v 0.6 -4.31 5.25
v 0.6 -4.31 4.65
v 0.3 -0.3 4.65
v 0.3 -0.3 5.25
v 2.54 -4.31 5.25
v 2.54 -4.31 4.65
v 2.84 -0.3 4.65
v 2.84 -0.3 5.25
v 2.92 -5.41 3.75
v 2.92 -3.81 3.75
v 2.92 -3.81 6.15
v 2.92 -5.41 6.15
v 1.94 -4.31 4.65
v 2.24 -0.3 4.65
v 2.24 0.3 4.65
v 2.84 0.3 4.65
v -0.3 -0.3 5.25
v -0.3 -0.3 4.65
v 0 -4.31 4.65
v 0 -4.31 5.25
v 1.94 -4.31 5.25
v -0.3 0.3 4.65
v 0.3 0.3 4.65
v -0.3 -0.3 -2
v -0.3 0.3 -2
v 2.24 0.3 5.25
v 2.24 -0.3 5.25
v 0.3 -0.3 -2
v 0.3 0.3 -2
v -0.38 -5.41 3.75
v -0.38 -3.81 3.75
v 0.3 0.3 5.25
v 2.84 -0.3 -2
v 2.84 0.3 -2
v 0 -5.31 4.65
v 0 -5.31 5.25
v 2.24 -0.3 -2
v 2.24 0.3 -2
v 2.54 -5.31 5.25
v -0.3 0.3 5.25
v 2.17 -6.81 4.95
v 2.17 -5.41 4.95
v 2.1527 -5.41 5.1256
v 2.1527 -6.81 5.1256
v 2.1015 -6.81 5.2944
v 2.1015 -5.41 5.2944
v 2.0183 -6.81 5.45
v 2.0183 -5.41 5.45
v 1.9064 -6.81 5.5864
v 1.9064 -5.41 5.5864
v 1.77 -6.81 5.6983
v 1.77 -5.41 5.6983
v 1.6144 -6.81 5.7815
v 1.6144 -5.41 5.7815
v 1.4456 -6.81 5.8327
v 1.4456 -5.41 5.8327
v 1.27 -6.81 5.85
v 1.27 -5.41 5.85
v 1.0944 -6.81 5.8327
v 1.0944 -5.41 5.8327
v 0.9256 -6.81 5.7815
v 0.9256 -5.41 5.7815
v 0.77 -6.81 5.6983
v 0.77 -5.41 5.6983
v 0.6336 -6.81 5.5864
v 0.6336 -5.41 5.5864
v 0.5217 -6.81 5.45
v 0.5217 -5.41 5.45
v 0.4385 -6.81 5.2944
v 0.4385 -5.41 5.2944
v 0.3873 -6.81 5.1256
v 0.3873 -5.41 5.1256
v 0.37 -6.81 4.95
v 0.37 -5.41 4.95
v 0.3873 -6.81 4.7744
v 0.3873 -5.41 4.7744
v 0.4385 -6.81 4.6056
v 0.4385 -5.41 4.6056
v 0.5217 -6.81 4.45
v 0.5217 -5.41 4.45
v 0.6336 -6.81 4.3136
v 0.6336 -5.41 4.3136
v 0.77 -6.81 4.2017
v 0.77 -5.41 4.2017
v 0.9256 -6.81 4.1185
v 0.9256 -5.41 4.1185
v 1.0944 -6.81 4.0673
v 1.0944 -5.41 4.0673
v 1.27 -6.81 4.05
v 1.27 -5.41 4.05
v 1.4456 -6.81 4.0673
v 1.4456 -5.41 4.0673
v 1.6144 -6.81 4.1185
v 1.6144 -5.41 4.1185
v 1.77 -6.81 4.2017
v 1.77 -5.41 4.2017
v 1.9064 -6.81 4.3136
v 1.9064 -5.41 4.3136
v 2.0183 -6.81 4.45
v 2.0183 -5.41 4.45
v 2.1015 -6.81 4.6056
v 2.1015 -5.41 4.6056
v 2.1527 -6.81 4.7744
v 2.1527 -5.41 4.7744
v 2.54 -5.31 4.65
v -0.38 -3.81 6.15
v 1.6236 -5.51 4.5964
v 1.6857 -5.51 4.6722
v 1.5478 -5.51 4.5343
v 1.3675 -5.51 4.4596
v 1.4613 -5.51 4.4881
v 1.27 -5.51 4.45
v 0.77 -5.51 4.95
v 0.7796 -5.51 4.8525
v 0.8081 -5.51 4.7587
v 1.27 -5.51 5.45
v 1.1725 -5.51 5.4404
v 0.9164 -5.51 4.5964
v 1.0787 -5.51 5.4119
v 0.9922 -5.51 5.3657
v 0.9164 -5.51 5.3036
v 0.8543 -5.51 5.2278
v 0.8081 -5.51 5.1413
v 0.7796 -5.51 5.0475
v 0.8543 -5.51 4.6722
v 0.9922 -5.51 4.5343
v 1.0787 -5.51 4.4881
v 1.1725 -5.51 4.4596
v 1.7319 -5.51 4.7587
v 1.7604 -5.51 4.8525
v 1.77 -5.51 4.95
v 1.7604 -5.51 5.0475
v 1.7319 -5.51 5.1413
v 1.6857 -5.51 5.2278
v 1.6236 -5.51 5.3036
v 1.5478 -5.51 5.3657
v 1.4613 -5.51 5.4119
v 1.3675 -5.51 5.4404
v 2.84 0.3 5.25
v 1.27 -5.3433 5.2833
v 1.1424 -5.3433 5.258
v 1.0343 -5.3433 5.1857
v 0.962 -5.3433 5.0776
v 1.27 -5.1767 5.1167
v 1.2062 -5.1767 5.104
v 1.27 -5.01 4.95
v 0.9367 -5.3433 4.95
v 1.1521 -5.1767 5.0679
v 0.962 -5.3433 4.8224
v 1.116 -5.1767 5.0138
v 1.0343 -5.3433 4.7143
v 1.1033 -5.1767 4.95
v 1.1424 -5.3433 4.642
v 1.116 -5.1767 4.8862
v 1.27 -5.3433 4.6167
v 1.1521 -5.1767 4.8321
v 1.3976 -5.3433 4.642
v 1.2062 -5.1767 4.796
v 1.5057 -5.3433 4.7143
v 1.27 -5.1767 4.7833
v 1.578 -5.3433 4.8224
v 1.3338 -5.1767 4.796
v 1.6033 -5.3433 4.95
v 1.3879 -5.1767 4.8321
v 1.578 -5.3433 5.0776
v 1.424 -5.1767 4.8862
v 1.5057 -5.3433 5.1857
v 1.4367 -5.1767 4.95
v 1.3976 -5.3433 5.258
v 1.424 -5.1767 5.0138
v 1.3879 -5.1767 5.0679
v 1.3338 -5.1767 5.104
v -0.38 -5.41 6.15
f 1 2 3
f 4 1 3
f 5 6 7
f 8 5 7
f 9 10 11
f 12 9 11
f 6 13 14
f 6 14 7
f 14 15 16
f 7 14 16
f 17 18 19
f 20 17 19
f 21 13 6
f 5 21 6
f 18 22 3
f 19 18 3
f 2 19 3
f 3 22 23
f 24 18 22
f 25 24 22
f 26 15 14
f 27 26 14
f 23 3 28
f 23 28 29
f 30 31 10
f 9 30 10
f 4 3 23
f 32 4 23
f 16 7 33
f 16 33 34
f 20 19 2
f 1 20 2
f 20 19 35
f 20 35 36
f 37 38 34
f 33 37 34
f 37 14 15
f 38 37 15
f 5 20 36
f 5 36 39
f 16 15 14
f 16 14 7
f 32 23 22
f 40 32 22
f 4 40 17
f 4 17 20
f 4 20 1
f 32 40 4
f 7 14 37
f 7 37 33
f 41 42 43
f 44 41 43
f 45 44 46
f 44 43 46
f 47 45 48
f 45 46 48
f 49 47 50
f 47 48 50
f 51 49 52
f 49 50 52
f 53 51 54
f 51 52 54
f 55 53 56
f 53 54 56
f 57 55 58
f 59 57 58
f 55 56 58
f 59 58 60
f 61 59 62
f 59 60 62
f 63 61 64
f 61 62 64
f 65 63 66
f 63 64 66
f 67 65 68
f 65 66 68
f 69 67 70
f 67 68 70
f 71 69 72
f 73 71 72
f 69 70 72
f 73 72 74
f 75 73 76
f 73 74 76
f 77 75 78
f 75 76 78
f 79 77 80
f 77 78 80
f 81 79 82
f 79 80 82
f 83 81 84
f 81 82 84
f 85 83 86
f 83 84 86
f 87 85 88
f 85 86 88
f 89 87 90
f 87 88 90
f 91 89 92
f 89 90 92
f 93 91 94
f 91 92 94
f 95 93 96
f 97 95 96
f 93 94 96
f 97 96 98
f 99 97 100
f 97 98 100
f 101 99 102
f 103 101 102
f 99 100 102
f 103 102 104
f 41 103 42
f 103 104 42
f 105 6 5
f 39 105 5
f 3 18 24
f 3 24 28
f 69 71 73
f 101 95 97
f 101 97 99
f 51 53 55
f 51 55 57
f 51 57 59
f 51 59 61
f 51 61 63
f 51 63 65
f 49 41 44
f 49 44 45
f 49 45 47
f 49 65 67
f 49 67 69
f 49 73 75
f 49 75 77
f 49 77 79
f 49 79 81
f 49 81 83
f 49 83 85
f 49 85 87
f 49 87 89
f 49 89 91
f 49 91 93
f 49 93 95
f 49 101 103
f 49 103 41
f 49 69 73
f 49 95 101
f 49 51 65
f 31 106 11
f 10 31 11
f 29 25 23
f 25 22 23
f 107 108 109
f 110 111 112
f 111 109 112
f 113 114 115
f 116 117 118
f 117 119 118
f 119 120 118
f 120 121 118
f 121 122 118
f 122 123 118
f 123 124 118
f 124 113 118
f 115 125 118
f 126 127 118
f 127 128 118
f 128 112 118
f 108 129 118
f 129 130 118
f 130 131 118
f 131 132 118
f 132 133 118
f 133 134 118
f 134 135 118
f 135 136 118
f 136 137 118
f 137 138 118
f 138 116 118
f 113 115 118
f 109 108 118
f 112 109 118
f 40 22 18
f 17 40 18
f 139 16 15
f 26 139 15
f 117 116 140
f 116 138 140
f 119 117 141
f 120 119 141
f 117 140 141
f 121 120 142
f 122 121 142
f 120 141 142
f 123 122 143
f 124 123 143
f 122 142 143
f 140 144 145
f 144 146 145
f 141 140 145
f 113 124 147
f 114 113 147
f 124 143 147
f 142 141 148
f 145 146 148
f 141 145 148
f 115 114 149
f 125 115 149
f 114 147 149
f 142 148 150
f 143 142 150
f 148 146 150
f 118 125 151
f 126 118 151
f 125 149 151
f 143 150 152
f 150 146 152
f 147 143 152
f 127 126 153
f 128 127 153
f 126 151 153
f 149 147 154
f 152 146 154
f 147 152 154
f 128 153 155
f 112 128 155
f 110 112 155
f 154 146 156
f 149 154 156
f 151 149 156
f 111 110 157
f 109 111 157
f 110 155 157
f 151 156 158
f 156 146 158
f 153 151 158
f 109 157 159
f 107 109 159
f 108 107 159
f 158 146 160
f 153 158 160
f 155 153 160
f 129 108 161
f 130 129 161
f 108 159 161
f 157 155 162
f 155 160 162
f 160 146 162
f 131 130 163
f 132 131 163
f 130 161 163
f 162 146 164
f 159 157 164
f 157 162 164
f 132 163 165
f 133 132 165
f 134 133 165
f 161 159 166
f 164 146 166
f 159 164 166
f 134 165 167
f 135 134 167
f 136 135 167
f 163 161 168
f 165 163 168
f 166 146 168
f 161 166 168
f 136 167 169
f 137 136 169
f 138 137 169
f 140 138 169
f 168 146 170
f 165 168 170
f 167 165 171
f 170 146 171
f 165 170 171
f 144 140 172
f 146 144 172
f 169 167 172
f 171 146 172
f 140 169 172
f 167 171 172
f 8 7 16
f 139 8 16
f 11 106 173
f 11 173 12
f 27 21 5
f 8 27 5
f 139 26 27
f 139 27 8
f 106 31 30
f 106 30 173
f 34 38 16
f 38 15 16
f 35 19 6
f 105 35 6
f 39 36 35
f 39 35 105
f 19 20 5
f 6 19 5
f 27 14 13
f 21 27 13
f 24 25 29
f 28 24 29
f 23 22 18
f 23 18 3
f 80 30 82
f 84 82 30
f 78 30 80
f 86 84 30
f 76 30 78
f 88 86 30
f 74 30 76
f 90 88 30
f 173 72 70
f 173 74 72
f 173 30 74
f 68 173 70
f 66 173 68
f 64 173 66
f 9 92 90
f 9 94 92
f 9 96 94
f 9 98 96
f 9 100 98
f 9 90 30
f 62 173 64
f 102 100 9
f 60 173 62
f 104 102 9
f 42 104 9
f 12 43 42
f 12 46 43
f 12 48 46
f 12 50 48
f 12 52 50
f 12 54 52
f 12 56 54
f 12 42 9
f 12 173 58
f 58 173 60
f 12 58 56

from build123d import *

# Parameters (mm, degrees)
SKETCH_W       = 0.6
SKETCH_H       = 0.6
PAD_DEPTH      = 4.65
PAD_DEPTH_BACK = 2
PAD001_DEPTH   = 0.6
SKETCH002_W    = 2.54
SKETCH002_H    = 0.6
PAD002_DEPTH   = 1
SKETCH004_W    = 3.3
SKETCH004_H    = 2.4
PAD003_DEPTH   = 1.6
SKETCH006_R    = 0.9
PAD004_DEPTH   = 1.4


with BuildPart() as pad:
    # Sketch → Pad (new body, two sides)
    with BuildSketch(Plane.XY) as pad_sk:
        Rectangle(SKETCH_W, SKETCH_H)
        with Locations((2.54, 0)):
            Rectangle(SKETCH_W, SKETCH_H)
    extrude(amount=PAD_DEPTH)
    extrude(pad_sk.sketch, amount=-PAD_DEPTH_BACK)


with BuildPart() as pad001:
    # Sketch001 → Pad001 (new body)
    with BuildSketch(Plane.XY.offset(4.65)):
        Polygon((0.3, 0.3), (-0.3, 0.3), (-0.3, -0.3), (0, -4.31), (0.6, -4.31), (0.3, -0.3), align=None)
        Polygon((2.84, 0.3), (2.24, 0.3), (2.24, -0.3), (1.94, -4.31), (2.54, -4.31), (2.84, -0.3), align=None)
    extrude(amount=PAD001_DEPTH)


with BuildPart() as pad002:
    # Sketch002 → Pad002 (new body)
    with BuildSketch(Plane.XZ.offset(4.31)):
        with Locations((1.27, 4.95)):
            Rectangle(SKETCH002_W, SKETCH002_H)
    extrude(amount=PAD002_DEPTH)


with BuildPart() as revolution001:
    # Sketch005 → Revolution001 (revolve)
    with BuildSketch(Plane.YZ.offset(1.27)):
        Polygon((-5.01, 4.95), (-5.51, 4.95), (-5.51, 5.45), align=None)
    revolve(axis=Axis((1.27, -3.977201, 4.95), (0, -1, 0)))


with BuildPart() as pad004:
    # Sketch004 → Pad003 (new body)
    with BuildSketch(Plane.XZ.offset(3.81)):
        with Locations((1.27, 4.95)):
            Rectangle(SKETCH004_W, SKETCH004_H)
    extrude(amount=PAD003_DEPTH)

    # Sketch006 → Pad004 (new body)
    with BuildSketch(Plane.XZ.offset(5.41)):
        with Locations((1.27, 4.95)):
            Circle(SKETCH006_R)
    extrude(amount=PAD004_DEPTH)


solid = Compound([pad.part, pad001.part, pad002.part, revolution001.part, pad004.part])
